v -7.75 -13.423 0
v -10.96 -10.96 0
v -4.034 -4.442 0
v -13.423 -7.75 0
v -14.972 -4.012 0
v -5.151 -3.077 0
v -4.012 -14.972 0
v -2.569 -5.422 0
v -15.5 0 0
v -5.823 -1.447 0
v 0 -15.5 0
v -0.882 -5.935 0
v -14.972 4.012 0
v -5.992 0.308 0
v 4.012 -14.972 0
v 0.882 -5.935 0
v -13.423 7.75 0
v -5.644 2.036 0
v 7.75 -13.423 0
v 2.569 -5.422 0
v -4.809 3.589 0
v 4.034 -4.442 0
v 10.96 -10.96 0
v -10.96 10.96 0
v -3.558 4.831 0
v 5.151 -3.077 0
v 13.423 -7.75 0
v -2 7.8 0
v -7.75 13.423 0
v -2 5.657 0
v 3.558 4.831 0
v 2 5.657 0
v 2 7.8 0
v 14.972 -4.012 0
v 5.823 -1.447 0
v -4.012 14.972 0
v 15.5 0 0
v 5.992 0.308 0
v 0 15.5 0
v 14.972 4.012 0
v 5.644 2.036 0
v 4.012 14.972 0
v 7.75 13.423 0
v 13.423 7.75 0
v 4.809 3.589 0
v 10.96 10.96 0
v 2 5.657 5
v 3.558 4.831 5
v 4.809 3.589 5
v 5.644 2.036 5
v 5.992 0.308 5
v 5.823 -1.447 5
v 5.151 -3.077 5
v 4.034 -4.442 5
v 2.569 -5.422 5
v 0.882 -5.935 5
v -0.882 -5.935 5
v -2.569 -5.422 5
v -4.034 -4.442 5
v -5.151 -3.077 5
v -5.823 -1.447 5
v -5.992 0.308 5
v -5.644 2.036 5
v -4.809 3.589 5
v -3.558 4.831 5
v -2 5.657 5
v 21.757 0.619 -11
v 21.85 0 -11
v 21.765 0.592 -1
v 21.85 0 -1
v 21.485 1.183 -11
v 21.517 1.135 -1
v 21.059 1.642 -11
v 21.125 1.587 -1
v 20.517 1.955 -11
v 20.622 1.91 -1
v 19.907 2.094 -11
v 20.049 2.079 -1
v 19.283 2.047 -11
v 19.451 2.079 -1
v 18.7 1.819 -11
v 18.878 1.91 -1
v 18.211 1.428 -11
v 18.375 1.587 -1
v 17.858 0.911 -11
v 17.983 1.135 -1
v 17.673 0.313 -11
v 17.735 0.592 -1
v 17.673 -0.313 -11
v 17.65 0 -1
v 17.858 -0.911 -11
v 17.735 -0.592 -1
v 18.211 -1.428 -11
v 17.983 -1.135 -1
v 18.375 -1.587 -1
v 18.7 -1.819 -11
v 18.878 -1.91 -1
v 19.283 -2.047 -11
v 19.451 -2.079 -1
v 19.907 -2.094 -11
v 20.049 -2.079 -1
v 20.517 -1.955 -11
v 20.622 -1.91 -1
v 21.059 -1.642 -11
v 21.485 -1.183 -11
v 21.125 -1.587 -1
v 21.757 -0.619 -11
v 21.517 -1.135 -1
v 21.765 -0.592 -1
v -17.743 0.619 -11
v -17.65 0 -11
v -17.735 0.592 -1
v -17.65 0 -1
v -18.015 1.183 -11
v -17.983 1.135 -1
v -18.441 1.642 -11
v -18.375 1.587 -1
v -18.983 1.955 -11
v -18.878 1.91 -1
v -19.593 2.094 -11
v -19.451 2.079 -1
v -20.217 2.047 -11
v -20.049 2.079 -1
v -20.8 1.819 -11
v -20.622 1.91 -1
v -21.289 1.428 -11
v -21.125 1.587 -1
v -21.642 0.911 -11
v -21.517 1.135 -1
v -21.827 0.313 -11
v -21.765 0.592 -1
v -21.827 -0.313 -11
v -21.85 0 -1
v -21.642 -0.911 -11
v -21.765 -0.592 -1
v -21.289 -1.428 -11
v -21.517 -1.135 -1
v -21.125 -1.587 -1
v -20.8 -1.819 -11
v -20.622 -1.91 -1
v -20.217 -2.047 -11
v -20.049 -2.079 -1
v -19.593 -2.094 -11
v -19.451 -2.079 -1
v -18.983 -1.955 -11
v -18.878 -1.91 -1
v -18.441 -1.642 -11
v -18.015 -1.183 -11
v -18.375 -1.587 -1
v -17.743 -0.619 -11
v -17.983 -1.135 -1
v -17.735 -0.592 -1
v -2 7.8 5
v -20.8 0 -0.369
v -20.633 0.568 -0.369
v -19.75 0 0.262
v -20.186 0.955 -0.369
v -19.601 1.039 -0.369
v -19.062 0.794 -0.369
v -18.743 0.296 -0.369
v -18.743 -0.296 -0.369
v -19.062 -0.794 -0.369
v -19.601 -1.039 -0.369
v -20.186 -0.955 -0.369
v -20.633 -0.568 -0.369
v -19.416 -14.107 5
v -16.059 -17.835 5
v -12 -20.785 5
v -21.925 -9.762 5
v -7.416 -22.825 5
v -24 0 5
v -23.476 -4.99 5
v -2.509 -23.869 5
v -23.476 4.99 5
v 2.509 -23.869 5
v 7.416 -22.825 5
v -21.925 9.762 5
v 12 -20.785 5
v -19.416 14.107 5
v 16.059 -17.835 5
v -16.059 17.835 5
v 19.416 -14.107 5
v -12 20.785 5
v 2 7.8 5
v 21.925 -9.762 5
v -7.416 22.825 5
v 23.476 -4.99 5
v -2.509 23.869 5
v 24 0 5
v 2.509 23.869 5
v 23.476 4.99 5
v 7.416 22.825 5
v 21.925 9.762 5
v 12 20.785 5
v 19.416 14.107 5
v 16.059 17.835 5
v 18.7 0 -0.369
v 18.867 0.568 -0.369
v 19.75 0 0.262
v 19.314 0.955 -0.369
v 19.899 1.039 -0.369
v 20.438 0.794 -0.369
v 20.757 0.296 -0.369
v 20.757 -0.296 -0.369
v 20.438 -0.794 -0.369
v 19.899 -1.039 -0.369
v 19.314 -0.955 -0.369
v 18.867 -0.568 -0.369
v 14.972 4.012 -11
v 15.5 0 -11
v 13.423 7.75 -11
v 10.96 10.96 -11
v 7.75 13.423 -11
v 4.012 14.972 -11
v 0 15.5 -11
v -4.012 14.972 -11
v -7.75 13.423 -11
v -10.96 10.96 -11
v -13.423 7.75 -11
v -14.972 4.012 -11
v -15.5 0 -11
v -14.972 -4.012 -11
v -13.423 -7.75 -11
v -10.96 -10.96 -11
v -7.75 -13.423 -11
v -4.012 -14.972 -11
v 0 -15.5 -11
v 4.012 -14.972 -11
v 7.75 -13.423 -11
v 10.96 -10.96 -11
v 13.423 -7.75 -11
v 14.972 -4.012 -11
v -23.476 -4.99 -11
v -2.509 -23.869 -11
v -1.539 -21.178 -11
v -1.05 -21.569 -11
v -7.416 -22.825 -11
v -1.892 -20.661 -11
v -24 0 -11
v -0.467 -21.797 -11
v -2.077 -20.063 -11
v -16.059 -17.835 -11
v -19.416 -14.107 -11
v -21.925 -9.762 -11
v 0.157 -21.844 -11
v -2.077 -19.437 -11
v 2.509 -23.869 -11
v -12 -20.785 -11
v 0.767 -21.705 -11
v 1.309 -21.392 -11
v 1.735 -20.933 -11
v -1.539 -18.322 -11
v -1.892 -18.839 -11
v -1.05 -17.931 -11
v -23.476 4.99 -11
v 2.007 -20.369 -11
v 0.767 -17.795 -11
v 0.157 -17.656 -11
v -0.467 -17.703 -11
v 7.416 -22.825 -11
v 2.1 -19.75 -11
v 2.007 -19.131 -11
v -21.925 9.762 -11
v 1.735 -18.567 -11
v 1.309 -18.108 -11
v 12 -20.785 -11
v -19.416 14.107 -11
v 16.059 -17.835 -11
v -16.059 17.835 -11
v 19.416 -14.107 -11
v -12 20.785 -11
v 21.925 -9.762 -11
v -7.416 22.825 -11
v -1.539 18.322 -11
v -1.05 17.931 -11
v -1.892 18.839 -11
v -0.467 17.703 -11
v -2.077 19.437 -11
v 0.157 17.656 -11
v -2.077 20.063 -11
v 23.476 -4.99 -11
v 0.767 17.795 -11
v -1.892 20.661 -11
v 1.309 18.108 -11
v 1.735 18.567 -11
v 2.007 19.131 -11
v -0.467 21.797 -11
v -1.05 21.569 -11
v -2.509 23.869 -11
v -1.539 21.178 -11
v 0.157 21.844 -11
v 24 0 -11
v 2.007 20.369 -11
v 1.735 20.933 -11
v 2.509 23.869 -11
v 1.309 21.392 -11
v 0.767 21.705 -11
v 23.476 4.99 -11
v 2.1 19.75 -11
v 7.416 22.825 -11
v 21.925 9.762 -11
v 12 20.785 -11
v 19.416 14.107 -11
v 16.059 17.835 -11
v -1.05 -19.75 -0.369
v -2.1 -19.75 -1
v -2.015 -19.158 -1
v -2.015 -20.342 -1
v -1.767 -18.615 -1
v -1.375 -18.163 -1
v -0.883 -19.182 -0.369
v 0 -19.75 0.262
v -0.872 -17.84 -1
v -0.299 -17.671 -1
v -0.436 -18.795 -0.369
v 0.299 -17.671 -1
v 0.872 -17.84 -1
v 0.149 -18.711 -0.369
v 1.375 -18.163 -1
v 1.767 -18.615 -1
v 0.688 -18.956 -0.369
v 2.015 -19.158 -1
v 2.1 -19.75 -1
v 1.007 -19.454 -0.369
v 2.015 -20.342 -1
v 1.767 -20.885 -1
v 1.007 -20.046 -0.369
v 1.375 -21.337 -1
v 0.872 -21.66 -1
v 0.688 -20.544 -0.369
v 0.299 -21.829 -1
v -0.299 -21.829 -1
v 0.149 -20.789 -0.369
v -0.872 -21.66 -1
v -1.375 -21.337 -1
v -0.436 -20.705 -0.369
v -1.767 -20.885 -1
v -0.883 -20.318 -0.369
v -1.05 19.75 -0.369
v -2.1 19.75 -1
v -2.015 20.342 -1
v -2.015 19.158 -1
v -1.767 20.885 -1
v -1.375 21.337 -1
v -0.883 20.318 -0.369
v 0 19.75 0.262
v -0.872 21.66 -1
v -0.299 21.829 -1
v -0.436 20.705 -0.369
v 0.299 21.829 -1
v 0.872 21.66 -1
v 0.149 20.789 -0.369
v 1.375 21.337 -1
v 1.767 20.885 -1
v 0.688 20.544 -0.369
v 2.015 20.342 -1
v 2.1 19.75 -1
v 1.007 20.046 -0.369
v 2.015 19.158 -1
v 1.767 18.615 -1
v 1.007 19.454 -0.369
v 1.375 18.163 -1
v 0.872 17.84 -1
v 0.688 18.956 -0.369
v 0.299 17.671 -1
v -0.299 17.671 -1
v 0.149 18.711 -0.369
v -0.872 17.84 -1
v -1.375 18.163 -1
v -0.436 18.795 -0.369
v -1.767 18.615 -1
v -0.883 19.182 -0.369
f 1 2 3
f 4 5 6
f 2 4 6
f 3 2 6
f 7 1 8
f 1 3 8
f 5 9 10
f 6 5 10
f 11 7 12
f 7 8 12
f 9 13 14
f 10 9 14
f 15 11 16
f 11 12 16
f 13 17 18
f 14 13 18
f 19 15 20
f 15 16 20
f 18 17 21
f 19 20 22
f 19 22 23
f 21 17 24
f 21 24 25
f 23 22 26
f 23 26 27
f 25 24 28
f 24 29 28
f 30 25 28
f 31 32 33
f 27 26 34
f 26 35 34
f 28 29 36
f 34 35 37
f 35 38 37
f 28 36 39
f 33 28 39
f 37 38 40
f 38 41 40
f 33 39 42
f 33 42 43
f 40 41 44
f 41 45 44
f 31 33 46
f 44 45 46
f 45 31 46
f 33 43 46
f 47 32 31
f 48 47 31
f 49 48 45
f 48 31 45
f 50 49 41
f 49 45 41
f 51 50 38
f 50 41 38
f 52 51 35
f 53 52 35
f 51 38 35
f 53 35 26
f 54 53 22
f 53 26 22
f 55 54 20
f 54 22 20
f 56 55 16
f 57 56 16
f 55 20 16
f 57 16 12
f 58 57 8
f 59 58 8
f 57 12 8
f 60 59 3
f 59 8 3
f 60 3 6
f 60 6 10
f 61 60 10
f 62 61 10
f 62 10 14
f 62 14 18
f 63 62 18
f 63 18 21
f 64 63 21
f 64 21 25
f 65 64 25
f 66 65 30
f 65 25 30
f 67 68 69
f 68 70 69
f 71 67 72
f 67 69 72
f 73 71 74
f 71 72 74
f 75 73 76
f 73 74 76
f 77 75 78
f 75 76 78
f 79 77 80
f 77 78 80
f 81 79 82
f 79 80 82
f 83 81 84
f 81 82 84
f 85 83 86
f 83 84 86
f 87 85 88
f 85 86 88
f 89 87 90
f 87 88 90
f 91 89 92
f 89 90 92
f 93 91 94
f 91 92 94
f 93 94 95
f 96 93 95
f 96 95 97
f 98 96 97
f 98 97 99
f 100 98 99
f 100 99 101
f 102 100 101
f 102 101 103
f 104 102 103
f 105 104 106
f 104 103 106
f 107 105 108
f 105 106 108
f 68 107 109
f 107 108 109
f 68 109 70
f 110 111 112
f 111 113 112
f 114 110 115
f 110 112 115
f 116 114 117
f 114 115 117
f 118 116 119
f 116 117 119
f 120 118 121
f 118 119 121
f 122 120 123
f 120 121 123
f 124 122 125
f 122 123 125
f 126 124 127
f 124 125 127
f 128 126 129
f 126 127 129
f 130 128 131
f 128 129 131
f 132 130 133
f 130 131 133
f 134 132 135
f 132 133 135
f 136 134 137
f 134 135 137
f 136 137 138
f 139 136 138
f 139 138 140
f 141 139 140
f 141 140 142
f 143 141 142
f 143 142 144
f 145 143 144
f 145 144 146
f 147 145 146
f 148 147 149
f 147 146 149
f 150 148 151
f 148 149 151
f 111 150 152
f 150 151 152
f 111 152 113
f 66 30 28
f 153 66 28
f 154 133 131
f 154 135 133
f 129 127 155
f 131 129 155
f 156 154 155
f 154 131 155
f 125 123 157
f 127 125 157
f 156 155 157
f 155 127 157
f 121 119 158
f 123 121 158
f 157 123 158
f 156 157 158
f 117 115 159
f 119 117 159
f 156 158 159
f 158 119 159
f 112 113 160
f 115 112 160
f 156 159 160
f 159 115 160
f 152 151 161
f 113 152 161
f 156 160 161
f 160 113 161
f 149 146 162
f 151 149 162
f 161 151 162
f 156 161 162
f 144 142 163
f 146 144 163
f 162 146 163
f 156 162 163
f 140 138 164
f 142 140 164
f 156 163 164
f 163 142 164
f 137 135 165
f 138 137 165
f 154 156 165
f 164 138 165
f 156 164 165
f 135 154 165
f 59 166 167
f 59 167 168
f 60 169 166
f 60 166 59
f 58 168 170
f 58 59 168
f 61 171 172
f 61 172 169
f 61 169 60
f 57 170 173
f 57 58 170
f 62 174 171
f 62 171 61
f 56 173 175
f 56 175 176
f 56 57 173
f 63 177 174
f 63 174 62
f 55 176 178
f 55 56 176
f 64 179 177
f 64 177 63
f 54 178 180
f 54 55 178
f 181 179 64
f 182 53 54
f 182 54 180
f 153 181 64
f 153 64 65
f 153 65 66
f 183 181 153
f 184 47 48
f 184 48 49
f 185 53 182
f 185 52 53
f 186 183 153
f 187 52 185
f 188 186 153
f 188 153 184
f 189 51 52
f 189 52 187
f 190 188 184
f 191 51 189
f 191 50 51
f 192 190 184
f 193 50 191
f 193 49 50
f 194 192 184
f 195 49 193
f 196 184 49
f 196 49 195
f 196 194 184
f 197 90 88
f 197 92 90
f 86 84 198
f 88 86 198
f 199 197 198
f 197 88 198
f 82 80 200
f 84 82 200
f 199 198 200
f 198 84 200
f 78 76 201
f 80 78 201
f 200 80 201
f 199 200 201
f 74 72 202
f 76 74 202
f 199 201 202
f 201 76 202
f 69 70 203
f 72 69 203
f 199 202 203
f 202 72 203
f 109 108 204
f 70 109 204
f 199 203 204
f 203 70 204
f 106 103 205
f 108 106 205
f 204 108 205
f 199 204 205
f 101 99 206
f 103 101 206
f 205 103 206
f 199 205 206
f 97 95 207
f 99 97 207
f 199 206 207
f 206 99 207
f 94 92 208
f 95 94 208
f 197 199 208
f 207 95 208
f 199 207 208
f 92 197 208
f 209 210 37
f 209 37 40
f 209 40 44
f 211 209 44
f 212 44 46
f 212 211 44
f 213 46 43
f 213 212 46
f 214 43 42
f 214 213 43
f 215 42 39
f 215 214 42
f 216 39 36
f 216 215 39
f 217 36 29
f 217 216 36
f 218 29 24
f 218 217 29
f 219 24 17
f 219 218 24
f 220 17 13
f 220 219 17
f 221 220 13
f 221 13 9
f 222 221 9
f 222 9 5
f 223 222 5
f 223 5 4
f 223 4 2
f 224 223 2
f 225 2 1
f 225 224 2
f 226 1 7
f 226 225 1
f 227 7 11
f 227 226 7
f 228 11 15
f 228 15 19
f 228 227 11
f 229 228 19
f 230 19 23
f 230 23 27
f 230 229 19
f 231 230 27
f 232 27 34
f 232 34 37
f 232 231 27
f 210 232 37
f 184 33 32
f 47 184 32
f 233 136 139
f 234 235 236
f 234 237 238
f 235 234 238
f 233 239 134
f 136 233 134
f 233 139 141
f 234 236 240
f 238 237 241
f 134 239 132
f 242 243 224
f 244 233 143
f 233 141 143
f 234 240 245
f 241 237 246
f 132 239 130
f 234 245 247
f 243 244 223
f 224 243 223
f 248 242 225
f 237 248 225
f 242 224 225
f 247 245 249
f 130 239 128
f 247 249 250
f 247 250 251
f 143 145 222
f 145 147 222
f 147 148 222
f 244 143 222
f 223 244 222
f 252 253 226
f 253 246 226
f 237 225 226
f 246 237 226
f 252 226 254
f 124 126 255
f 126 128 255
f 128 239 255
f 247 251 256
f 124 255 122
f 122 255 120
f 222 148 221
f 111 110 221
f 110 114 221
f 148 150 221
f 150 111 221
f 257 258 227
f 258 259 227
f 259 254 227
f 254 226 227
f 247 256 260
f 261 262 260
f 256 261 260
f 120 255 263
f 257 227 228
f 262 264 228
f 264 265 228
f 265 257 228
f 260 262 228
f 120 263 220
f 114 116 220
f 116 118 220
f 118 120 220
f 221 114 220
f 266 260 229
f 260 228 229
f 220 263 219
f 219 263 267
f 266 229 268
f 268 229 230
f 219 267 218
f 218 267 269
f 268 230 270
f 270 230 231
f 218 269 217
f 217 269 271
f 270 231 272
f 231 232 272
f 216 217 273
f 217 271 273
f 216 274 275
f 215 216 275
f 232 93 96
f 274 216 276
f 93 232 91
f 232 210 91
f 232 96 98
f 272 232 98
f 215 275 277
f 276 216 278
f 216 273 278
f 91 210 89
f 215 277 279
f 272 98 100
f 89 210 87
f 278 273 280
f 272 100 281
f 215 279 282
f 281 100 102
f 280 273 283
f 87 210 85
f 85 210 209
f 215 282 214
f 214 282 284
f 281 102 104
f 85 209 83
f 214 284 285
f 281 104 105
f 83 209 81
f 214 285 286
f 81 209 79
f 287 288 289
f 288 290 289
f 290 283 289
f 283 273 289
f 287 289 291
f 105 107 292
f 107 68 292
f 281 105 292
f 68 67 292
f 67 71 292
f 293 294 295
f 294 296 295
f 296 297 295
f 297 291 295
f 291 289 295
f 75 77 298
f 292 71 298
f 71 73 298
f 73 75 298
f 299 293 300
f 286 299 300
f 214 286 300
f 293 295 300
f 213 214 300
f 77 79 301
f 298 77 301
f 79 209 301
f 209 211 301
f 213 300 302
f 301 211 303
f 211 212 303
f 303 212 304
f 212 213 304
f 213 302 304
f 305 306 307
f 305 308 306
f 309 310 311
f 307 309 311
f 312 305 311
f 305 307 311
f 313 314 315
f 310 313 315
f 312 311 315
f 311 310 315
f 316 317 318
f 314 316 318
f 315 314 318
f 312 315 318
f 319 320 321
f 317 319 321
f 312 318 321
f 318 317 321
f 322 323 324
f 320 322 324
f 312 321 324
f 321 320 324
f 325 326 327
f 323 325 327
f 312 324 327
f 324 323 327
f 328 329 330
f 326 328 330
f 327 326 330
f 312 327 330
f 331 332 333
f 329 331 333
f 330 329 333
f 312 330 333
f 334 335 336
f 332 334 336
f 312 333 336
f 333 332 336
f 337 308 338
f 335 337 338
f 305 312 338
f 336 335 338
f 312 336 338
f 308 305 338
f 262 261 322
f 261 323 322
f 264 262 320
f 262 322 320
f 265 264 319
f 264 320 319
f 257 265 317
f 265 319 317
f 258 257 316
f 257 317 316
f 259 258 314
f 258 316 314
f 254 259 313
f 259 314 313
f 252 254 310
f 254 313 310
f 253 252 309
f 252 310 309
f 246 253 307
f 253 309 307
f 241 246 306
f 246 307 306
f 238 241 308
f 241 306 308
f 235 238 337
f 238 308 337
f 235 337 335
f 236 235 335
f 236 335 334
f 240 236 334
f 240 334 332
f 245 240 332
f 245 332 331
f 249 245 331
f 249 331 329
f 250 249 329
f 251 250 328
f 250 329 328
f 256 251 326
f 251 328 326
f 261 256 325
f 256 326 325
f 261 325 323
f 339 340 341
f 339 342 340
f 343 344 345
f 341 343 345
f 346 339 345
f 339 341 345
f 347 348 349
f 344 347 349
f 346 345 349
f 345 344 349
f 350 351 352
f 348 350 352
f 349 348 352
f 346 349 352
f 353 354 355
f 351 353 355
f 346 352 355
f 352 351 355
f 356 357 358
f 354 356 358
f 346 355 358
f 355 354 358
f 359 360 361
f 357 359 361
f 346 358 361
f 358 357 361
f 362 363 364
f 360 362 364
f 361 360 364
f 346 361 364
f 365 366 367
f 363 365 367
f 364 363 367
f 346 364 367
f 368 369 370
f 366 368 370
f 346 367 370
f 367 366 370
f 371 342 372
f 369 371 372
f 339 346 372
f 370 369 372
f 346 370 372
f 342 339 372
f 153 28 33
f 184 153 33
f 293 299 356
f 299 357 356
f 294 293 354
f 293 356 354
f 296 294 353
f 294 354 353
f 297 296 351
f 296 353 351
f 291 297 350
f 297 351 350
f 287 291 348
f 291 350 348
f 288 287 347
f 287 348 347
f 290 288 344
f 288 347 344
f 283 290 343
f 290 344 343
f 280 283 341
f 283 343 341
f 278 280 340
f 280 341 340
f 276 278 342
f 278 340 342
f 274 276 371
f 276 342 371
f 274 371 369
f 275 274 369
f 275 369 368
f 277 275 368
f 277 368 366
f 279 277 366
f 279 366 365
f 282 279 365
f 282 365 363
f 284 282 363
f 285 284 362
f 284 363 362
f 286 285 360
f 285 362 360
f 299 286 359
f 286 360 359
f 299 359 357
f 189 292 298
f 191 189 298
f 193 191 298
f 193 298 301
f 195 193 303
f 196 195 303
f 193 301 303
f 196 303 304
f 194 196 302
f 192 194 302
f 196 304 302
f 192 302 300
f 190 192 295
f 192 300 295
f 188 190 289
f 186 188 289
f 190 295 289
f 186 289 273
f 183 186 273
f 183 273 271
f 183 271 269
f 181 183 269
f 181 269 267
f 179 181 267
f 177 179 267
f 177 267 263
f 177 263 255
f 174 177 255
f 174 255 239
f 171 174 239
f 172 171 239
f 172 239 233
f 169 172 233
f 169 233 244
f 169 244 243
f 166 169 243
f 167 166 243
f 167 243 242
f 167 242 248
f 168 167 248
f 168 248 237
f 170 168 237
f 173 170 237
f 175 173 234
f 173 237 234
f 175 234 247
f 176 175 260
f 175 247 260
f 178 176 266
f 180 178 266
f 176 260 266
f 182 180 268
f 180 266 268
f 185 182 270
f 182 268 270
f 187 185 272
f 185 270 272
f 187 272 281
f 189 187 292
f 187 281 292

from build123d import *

# Parameters (mm, degrees)
SKETCH1_R                       = 24
BOSS_EXTRUDE1_DEPTH             = 5
BOSS_EXTRUDE2_START             = -11
SKETCH1_3_R                     = 24
SKETCH1_3_R_2                   = 15.5
BOSS_EXTRUDE2_DEPTH             = 11
TAP_DRILL_FOR_M5X0_8_TAP1_D     = 4.2
TAP_DRILL_FOR_M5X0_8_TAP1_DEPTH = 10
TAP_DRILL_FOR_M5X0_8_TAP1_TIP   = 1.2618073


with BuildPart() as part:
    # Sketch1 → Boss-Extrude1 (new body)
    with BuildSketch(Plane.XY):
        Circle(SKETCH1_R)
        with BuildLine():
            Line((-2, 5.656854249), (-2, 7.8))
            Line((-2, 7.8), (2, 7.8))
            Line((2, 7.8), (2, 5.656854249))
            ThreePointArc((2, 5.656854249), (0, -6), (-2, 5.656854249))
        make_face(mode=Mode.SUBTRACT)
    extrude(amount=BOSS_EXTRUDE1_DEPTH)

    # Sketch1<3> → Boss-Extrude2 (add)
    with BuildSketch(Plane.XY.offset(BOSS_EXTRUDE2_START)):
        Circle(SKETCH1_3_R)
        Circle(SKETCH1_3_R_2, mode=Mode.SUBTRACT)
    extrude(amount=BOSS_EXTRUDE2_DEPTH)

    # Tap Drill for M5x0.8 Tap1
    with Locations(Plane(origin=(0, 0, -11), x_dir=(-1, 0, 0), z_dir=(0, 0, -1))):
        with Locations((-19.75, 0), (0, -19.75), (19.75, 0), (0, 19.75)):
            Hole(TAP_DRILL_FOR_M5X0_8_TAP1_D / 2, depth=TAP_DRILL_FOR_M5X0_8_TAP1_DEPTH)
            with Locations((0, 0, -(TAP_DRILL_FOR_M5X0_8_TAP1_DEPTH + TAP_DRILL_FOR_M5X0_8_TAP1_TIP / 2))):  # 118° drill point
                Cone(0, TAP_DRILL_FOR_M5X0_8_TAP1_D / 2, TAP_DRILL_FOR_M5X0_8_TAP1_TIP, mode=Mode.SUBTRACT)


solid = part.part
